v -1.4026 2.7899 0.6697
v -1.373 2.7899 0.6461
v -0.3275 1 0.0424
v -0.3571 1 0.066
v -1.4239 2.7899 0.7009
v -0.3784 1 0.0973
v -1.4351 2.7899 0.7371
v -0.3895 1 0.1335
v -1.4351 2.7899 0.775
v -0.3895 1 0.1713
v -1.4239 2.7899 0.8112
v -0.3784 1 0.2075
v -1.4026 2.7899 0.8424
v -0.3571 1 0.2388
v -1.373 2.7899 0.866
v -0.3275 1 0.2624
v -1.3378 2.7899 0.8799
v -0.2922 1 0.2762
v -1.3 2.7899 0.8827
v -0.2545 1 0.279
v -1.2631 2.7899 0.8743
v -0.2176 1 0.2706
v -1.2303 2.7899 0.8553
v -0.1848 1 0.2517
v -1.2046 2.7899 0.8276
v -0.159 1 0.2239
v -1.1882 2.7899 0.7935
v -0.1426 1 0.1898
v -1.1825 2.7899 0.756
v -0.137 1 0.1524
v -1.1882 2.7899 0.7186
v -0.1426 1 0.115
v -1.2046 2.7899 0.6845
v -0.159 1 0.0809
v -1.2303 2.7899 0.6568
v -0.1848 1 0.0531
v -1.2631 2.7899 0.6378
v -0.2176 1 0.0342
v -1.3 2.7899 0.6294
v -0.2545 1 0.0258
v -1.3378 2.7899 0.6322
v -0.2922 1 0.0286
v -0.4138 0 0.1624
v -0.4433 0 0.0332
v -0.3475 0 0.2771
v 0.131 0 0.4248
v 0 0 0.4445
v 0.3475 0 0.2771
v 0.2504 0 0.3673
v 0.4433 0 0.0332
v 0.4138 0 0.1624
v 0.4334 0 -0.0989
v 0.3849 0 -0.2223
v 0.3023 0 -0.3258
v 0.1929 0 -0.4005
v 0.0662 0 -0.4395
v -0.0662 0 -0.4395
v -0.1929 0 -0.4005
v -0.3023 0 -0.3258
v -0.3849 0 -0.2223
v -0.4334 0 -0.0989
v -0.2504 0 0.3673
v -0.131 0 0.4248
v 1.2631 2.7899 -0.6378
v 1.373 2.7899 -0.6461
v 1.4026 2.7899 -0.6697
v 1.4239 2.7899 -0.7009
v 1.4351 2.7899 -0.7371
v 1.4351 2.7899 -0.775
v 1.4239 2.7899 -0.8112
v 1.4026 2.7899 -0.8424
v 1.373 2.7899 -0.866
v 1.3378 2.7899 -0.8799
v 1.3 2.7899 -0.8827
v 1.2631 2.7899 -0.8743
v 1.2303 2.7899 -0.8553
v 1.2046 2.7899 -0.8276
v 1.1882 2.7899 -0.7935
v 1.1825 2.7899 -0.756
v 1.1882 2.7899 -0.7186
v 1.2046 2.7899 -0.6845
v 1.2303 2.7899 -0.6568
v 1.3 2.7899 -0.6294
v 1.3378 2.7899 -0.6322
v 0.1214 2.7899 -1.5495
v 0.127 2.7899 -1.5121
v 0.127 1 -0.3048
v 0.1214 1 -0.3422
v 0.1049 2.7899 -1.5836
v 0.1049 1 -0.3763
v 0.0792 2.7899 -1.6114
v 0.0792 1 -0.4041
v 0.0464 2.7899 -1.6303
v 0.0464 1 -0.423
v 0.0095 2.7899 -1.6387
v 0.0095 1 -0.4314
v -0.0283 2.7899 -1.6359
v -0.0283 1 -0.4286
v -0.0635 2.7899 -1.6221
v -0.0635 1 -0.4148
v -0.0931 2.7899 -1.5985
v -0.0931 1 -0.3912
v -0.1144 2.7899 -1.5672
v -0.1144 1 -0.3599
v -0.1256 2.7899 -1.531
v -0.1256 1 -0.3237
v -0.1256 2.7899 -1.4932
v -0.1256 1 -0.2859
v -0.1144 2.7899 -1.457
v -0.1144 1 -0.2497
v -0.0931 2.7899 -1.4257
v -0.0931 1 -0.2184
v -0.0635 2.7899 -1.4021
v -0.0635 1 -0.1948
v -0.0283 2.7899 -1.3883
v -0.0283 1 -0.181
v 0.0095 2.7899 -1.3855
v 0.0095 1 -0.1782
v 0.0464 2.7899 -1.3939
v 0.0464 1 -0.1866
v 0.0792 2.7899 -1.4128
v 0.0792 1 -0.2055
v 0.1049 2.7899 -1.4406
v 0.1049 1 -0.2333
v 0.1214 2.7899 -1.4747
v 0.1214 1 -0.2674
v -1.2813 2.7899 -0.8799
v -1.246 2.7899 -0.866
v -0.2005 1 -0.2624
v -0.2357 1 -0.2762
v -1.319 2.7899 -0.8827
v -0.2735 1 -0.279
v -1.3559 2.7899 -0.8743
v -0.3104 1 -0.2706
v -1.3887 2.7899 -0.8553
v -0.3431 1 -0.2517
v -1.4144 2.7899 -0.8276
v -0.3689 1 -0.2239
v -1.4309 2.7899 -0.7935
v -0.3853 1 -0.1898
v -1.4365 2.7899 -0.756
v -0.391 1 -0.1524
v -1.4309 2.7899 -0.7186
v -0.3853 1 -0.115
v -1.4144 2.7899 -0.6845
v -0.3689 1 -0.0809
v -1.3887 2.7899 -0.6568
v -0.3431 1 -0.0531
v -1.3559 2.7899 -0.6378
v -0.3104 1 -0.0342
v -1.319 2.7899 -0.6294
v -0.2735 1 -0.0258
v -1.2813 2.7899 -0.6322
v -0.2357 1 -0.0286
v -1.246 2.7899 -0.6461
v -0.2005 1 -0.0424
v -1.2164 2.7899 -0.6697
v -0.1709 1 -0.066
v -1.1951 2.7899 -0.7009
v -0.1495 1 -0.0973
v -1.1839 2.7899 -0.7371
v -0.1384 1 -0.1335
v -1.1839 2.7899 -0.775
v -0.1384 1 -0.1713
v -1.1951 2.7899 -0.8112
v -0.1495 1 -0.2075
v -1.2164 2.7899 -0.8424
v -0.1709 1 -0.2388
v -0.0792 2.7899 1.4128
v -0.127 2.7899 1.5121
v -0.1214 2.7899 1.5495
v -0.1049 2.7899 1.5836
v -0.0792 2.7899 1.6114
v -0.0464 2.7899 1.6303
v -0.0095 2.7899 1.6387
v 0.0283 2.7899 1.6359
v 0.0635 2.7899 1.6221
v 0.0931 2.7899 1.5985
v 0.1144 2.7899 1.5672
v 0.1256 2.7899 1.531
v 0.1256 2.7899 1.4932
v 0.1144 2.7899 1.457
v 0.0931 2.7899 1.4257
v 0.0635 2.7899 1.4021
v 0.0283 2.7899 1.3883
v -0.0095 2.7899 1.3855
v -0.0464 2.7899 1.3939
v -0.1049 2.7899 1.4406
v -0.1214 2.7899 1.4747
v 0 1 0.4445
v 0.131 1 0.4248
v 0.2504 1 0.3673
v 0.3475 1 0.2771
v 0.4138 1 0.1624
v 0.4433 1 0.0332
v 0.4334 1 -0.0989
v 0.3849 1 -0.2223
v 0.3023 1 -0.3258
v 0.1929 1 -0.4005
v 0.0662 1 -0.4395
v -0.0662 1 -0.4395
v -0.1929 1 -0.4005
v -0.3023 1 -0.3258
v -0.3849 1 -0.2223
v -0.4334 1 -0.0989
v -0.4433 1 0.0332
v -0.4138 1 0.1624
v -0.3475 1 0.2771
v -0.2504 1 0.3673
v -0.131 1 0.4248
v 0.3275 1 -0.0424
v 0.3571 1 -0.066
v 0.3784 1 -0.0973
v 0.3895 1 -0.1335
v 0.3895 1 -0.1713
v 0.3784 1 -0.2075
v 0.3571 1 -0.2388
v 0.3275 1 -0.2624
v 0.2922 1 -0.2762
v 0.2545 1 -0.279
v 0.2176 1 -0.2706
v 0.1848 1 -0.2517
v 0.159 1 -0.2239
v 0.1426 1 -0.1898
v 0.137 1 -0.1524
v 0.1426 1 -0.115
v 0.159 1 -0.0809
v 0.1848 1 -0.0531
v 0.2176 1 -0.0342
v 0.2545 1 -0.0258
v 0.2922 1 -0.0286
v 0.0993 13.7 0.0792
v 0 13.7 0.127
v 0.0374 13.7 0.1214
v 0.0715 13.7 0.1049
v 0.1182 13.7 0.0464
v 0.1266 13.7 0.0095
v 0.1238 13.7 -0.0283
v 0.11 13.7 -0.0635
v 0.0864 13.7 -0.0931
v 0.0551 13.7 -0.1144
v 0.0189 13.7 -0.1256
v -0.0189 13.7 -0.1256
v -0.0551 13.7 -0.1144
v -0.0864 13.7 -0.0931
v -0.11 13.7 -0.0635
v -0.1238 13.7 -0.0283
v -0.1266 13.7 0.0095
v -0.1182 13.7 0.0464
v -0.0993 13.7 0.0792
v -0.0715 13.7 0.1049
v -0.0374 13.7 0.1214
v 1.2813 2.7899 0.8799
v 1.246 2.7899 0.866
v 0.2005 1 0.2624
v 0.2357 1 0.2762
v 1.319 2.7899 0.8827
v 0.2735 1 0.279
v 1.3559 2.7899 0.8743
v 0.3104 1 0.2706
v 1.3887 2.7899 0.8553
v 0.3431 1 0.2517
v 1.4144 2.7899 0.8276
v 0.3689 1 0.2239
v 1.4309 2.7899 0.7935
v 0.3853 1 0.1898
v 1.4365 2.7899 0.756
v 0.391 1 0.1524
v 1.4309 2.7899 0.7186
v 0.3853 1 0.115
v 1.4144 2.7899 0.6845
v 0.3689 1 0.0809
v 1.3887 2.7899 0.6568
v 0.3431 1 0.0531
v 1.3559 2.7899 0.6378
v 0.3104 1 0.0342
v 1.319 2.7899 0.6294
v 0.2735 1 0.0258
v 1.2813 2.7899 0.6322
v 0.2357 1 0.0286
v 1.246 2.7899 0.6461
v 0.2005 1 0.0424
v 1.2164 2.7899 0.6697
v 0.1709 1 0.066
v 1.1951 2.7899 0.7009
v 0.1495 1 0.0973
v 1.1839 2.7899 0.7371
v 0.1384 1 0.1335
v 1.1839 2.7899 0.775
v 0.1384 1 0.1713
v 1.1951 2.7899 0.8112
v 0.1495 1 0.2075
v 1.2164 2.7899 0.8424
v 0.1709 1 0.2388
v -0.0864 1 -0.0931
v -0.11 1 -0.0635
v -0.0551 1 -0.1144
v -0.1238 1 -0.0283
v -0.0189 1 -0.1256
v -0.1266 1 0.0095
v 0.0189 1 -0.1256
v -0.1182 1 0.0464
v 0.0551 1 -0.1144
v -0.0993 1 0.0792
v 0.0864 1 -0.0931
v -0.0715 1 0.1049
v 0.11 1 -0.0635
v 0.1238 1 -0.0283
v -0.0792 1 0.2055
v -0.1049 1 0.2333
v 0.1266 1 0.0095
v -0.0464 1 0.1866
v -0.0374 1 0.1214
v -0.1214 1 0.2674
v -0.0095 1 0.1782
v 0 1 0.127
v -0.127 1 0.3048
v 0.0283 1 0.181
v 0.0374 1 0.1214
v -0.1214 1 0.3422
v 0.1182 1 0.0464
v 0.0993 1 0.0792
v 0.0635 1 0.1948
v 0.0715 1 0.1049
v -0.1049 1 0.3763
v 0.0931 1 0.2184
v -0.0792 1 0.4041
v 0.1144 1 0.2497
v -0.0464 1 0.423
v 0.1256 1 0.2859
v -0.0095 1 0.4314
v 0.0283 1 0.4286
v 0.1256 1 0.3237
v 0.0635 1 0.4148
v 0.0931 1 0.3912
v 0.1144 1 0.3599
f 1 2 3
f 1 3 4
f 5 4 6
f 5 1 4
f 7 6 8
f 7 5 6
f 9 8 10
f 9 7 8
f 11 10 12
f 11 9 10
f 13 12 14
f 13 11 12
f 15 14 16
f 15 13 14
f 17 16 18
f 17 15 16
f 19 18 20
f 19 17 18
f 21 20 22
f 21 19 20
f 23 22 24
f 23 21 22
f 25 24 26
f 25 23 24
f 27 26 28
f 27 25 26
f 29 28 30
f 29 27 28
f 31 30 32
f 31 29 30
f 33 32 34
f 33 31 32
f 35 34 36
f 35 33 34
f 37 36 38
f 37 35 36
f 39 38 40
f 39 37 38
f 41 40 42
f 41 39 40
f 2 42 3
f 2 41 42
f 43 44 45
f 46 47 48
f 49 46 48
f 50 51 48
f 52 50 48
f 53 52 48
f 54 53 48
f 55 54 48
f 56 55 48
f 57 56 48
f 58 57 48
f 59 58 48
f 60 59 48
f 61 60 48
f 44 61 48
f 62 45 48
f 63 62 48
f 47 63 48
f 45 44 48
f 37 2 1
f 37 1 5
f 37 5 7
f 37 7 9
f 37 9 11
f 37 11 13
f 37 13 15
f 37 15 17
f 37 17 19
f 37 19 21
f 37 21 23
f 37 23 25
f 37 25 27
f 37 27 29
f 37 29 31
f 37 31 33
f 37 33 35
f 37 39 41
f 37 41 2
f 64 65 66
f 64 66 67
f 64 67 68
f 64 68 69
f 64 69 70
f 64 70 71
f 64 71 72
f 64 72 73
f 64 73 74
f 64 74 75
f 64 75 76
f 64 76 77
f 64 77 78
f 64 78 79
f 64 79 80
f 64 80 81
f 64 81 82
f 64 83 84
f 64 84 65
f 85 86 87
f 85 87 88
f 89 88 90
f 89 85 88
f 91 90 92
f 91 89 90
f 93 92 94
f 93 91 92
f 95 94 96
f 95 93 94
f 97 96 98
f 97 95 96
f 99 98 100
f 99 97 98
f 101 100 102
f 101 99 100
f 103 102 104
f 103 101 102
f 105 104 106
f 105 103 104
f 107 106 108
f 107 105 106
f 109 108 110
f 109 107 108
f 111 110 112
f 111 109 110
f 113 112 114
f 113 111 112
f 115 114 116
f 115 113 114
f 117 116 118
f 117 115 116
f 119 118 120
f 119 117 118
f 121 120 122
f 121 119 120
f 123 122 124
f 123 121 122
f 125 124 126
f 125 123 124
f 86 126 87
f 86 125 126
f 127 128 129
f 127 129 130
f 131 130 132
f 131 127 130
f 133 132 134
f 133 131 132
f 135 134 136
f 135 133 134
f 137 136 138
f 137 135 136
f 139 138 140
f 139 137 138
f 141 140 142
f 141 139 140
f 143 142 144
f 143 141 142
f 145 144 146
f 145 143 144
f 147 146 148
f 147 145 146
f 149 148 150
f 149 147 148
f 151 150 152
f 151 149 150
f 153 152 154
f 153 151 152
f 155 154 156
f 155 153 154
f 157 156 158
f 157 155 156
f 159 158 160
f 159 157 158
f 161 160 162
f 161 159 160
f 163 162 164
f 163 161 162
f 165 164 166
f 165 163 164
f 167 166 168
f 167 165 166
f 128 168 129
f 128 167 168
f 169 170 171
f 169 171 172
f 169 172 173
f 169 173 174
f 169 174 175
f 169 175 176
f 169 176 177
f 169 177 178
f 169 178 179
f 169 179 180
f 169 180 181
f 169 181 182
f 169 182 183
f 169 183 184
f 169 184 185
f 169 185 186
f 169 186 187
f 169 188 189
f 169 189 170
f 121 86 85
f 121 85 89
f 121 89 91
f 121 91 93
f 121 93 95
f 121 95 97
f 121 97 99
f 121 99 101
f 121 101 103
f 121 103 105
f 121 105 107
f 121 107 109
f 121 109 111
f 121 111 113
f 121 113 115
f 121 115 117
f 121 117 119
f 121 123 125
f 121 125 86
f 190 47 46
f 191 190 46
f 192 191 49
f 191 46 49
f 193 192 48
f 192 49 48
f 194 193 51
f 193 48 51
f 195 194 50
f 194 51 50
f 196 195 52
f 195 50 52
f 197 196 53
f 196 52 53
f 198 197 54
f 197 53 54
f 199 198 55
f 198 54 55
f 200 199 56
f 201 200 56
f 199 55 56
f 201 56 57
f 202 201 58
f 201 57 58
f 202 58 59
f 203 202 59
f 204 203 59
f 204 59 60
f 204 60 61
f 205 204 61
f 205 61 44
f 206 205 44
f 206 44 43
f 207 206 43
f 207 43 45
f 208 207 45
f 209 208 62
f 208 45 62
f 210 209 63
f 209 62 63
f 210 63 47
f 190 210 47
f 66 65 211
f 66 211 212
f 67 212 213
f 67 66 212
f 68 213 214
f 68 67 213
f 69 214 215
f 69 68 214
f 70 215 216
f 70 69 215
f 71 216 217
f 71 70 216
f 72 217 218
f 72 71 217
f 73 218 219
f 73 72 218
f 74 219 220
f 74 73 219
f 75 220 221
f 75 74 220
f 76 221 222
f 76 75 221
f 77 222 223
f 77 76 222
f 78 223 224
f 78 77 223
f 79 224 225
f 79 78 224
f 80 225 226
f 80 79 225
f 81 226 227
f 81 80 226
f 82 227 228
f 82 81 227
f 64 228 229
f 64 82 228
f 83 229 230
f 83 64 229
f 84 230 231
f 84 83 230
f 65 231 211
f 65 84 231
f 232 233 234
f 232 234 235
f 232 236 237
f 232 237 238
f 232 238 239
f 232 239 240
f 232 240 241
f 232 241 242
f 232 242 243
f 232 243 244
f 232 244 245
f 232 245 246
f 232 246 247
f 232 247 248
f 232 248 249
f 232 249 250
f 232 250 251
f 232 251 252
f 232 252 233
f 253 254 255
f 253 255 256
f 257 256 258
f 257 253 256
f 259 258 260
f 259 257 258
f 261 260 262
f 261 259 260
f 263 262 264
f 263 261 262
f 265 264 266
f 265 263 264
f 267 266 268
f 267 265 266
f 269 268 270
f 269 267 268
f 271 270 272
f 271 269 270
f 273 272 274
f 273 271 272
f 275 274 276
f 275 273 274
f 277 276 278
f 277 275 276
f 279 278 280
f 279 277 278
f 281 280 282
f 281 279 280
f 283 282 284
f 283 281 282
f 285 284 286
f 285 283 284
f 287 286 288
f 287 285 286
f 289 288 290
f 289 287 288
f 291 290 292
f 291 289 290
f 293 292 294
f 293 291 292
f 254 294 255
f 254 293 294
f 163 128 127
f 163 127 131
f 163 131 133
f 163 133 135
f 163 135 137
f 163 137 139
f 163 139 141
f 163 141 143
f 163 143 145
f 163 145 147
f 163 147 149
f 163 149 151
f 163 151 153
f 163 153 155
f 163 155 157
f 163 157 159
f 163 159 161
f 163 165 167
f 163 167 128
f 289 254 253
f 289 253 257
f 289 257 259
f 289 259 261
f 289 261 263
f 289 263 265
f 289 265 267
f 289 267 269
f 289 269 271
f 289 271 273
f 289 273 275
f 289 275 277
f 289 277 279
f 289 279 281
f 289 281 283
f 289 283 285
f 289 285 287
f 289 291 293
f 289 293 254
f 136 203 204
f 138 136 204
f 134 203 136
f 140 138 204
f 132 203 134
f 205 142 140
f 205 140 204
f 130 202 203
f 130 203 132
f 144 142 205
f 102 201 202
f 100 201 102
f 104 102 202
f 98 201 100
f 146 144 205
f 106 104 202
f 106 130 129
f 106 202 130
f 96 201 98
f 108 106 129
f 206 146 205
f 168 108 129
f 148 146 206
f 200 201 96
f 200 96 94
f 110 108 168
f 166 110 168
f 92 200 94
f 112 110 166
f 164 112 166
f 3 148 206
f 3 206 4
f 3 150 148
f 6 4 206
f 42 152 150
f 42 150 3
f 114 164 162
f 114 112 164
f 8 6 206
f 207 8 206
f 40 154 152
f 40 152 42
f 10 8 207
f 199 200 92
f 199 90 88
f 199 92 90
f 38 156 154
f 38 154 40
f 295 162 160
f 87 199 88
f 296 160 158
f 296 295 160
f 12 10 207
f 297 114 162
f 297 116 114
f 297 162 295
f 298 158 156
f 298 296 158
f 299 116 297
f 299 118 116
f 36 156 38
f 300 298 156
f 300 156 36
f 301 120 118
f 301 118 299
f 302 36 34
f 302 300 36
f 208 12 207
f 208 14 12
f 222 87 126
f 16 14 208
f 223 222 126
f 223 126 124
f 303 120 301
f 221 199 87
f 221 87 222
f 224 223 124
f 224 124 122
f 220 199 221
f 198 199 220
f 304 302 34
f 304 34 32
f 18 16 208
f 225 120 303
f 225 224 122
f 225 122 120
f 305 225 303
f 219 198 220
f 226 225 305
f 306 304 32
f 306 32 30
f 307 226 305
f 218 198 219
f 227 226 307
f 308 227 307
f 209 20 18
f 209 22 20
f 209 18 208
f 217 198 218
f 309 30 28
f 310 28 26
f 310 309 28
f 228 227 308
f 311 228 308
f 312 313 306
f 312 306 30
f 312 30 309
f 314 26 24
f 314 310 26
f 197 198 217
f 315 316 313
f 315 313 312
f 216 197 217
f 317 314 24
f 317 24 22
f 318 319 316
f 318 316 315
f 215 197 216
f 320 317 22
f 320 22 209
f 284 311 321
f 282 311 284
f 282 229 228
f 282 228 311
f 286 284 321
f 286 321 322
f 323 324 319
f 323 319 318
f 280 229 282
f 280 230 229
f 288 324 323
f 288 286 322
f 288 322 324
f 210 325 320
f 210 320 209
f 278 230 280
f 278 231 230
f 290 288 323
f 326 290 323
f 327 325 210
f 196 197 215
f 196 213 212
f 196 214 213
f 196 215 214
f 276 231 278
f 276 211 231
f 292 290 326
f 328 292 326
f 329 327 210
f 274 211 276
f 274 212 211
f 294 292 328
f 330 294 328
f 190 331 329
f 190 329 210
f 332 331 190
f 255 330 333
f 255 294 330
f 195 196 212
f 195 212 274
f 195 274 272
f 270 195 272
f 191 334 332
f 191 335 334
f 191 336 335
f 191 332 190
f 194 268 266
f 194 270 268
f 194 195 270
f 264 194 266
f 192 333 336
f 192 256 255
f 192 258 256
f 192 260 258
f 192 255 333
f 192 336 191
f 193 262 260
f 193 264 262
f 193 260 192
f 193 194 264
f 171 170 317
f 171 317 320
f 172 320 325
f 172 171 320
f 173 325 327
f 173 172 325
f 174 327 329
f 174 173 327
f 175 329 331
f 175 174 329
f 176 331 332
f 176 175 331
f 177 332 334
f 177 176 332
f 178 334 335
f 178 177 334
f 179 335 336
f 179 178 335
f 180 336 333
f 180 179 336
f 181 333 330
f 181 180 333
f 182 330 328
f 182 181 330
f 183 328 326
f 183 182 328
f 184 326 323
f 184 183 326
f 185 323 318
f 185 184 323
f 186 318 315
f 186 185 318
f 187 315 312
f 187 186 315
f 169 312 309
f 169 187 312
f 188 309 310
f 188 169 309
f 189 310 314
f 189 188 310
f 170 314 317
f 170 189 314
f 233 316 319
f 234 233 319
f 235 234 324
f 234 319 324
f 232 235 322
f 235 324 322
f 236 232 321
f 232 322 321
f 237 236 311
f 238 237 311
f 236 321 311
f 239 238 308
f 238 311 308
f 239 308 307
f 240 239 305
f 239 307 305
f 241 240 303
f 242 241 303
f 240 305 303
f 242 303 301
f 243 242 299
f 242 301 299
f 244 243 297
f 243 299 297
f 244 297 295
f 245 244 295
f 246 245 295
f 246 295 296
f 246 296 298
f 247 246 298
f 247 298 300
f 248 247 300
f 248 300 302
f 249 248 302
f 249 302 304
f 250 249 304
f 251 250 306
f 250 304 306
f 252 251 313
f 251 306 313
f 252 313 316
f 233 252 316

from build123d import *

# Parameters (mm, degrees)
SKETCH1_R           = 0.4445
BOSS_EXTRUDE1_DEPTH = 1
SKETCH2_R           = 0.127
BOSS_EXTRUDE2_DEPTH = 12.7
SKETCH3_R           = 0.127
CIRPATTERN1_COUNT   = 6


with BuildPart() as part:
    # Sketch1 → Boss-Extrude1 (new body)
    with BuildSketch(Plane(origin=(0, 0, 0), x_dir=(1, 0, 0), z_dir=(0, 1, 0))):
        with Locations(Location((0, 0, 0), (0, 0, 270))):
            Circle(SKETCH1_R)
    extrude(amount=BOSS_EXTRUDE1_DEPTH)

    # Sketch2 → Boss-Extrude2 (add)
    with BuildSketch(Plane(origin=(0, 1, 0), x_dir=(1, 0, 0), z_dir=(0, 1, 0))):
        with Locations(Location((0, 0, 0), (0, 0, 270))):
            Circle(SKETCH2_R)
    extrude(amount=BOSS_EXTRUDE2_DEPTH)

    # Sweep2: sweep along a curve in space
    with BuildLine() as sweep2_path:
        Line((0, 1, -0.3048), (0, 2.789892119, -1.512097479))
    # Sketch3 → Sweep2 (sweep)
    with BuildSketch(Plane(origin=(0, 1, 0), x_dir=(1, 0, 0), z_dir=(0, 1, 0))):
        with Locations((0, 0.3048)):
            Circle(SKETCH3_R)
    sweep2 = sweep(path=sweep2_path.line)

    # CirPattern1: Sweep2 ×6 about axis
    cirpattern1_axis = Axis((0, 1, 0), (0, 1, 0))
    for i in range(1, CIRPATTERN1_COUNT):
        add(sweep2.rotate(cirpattern1_axis, i * 360 / CIRPATTERN1_COUNT))


solid = part.part
